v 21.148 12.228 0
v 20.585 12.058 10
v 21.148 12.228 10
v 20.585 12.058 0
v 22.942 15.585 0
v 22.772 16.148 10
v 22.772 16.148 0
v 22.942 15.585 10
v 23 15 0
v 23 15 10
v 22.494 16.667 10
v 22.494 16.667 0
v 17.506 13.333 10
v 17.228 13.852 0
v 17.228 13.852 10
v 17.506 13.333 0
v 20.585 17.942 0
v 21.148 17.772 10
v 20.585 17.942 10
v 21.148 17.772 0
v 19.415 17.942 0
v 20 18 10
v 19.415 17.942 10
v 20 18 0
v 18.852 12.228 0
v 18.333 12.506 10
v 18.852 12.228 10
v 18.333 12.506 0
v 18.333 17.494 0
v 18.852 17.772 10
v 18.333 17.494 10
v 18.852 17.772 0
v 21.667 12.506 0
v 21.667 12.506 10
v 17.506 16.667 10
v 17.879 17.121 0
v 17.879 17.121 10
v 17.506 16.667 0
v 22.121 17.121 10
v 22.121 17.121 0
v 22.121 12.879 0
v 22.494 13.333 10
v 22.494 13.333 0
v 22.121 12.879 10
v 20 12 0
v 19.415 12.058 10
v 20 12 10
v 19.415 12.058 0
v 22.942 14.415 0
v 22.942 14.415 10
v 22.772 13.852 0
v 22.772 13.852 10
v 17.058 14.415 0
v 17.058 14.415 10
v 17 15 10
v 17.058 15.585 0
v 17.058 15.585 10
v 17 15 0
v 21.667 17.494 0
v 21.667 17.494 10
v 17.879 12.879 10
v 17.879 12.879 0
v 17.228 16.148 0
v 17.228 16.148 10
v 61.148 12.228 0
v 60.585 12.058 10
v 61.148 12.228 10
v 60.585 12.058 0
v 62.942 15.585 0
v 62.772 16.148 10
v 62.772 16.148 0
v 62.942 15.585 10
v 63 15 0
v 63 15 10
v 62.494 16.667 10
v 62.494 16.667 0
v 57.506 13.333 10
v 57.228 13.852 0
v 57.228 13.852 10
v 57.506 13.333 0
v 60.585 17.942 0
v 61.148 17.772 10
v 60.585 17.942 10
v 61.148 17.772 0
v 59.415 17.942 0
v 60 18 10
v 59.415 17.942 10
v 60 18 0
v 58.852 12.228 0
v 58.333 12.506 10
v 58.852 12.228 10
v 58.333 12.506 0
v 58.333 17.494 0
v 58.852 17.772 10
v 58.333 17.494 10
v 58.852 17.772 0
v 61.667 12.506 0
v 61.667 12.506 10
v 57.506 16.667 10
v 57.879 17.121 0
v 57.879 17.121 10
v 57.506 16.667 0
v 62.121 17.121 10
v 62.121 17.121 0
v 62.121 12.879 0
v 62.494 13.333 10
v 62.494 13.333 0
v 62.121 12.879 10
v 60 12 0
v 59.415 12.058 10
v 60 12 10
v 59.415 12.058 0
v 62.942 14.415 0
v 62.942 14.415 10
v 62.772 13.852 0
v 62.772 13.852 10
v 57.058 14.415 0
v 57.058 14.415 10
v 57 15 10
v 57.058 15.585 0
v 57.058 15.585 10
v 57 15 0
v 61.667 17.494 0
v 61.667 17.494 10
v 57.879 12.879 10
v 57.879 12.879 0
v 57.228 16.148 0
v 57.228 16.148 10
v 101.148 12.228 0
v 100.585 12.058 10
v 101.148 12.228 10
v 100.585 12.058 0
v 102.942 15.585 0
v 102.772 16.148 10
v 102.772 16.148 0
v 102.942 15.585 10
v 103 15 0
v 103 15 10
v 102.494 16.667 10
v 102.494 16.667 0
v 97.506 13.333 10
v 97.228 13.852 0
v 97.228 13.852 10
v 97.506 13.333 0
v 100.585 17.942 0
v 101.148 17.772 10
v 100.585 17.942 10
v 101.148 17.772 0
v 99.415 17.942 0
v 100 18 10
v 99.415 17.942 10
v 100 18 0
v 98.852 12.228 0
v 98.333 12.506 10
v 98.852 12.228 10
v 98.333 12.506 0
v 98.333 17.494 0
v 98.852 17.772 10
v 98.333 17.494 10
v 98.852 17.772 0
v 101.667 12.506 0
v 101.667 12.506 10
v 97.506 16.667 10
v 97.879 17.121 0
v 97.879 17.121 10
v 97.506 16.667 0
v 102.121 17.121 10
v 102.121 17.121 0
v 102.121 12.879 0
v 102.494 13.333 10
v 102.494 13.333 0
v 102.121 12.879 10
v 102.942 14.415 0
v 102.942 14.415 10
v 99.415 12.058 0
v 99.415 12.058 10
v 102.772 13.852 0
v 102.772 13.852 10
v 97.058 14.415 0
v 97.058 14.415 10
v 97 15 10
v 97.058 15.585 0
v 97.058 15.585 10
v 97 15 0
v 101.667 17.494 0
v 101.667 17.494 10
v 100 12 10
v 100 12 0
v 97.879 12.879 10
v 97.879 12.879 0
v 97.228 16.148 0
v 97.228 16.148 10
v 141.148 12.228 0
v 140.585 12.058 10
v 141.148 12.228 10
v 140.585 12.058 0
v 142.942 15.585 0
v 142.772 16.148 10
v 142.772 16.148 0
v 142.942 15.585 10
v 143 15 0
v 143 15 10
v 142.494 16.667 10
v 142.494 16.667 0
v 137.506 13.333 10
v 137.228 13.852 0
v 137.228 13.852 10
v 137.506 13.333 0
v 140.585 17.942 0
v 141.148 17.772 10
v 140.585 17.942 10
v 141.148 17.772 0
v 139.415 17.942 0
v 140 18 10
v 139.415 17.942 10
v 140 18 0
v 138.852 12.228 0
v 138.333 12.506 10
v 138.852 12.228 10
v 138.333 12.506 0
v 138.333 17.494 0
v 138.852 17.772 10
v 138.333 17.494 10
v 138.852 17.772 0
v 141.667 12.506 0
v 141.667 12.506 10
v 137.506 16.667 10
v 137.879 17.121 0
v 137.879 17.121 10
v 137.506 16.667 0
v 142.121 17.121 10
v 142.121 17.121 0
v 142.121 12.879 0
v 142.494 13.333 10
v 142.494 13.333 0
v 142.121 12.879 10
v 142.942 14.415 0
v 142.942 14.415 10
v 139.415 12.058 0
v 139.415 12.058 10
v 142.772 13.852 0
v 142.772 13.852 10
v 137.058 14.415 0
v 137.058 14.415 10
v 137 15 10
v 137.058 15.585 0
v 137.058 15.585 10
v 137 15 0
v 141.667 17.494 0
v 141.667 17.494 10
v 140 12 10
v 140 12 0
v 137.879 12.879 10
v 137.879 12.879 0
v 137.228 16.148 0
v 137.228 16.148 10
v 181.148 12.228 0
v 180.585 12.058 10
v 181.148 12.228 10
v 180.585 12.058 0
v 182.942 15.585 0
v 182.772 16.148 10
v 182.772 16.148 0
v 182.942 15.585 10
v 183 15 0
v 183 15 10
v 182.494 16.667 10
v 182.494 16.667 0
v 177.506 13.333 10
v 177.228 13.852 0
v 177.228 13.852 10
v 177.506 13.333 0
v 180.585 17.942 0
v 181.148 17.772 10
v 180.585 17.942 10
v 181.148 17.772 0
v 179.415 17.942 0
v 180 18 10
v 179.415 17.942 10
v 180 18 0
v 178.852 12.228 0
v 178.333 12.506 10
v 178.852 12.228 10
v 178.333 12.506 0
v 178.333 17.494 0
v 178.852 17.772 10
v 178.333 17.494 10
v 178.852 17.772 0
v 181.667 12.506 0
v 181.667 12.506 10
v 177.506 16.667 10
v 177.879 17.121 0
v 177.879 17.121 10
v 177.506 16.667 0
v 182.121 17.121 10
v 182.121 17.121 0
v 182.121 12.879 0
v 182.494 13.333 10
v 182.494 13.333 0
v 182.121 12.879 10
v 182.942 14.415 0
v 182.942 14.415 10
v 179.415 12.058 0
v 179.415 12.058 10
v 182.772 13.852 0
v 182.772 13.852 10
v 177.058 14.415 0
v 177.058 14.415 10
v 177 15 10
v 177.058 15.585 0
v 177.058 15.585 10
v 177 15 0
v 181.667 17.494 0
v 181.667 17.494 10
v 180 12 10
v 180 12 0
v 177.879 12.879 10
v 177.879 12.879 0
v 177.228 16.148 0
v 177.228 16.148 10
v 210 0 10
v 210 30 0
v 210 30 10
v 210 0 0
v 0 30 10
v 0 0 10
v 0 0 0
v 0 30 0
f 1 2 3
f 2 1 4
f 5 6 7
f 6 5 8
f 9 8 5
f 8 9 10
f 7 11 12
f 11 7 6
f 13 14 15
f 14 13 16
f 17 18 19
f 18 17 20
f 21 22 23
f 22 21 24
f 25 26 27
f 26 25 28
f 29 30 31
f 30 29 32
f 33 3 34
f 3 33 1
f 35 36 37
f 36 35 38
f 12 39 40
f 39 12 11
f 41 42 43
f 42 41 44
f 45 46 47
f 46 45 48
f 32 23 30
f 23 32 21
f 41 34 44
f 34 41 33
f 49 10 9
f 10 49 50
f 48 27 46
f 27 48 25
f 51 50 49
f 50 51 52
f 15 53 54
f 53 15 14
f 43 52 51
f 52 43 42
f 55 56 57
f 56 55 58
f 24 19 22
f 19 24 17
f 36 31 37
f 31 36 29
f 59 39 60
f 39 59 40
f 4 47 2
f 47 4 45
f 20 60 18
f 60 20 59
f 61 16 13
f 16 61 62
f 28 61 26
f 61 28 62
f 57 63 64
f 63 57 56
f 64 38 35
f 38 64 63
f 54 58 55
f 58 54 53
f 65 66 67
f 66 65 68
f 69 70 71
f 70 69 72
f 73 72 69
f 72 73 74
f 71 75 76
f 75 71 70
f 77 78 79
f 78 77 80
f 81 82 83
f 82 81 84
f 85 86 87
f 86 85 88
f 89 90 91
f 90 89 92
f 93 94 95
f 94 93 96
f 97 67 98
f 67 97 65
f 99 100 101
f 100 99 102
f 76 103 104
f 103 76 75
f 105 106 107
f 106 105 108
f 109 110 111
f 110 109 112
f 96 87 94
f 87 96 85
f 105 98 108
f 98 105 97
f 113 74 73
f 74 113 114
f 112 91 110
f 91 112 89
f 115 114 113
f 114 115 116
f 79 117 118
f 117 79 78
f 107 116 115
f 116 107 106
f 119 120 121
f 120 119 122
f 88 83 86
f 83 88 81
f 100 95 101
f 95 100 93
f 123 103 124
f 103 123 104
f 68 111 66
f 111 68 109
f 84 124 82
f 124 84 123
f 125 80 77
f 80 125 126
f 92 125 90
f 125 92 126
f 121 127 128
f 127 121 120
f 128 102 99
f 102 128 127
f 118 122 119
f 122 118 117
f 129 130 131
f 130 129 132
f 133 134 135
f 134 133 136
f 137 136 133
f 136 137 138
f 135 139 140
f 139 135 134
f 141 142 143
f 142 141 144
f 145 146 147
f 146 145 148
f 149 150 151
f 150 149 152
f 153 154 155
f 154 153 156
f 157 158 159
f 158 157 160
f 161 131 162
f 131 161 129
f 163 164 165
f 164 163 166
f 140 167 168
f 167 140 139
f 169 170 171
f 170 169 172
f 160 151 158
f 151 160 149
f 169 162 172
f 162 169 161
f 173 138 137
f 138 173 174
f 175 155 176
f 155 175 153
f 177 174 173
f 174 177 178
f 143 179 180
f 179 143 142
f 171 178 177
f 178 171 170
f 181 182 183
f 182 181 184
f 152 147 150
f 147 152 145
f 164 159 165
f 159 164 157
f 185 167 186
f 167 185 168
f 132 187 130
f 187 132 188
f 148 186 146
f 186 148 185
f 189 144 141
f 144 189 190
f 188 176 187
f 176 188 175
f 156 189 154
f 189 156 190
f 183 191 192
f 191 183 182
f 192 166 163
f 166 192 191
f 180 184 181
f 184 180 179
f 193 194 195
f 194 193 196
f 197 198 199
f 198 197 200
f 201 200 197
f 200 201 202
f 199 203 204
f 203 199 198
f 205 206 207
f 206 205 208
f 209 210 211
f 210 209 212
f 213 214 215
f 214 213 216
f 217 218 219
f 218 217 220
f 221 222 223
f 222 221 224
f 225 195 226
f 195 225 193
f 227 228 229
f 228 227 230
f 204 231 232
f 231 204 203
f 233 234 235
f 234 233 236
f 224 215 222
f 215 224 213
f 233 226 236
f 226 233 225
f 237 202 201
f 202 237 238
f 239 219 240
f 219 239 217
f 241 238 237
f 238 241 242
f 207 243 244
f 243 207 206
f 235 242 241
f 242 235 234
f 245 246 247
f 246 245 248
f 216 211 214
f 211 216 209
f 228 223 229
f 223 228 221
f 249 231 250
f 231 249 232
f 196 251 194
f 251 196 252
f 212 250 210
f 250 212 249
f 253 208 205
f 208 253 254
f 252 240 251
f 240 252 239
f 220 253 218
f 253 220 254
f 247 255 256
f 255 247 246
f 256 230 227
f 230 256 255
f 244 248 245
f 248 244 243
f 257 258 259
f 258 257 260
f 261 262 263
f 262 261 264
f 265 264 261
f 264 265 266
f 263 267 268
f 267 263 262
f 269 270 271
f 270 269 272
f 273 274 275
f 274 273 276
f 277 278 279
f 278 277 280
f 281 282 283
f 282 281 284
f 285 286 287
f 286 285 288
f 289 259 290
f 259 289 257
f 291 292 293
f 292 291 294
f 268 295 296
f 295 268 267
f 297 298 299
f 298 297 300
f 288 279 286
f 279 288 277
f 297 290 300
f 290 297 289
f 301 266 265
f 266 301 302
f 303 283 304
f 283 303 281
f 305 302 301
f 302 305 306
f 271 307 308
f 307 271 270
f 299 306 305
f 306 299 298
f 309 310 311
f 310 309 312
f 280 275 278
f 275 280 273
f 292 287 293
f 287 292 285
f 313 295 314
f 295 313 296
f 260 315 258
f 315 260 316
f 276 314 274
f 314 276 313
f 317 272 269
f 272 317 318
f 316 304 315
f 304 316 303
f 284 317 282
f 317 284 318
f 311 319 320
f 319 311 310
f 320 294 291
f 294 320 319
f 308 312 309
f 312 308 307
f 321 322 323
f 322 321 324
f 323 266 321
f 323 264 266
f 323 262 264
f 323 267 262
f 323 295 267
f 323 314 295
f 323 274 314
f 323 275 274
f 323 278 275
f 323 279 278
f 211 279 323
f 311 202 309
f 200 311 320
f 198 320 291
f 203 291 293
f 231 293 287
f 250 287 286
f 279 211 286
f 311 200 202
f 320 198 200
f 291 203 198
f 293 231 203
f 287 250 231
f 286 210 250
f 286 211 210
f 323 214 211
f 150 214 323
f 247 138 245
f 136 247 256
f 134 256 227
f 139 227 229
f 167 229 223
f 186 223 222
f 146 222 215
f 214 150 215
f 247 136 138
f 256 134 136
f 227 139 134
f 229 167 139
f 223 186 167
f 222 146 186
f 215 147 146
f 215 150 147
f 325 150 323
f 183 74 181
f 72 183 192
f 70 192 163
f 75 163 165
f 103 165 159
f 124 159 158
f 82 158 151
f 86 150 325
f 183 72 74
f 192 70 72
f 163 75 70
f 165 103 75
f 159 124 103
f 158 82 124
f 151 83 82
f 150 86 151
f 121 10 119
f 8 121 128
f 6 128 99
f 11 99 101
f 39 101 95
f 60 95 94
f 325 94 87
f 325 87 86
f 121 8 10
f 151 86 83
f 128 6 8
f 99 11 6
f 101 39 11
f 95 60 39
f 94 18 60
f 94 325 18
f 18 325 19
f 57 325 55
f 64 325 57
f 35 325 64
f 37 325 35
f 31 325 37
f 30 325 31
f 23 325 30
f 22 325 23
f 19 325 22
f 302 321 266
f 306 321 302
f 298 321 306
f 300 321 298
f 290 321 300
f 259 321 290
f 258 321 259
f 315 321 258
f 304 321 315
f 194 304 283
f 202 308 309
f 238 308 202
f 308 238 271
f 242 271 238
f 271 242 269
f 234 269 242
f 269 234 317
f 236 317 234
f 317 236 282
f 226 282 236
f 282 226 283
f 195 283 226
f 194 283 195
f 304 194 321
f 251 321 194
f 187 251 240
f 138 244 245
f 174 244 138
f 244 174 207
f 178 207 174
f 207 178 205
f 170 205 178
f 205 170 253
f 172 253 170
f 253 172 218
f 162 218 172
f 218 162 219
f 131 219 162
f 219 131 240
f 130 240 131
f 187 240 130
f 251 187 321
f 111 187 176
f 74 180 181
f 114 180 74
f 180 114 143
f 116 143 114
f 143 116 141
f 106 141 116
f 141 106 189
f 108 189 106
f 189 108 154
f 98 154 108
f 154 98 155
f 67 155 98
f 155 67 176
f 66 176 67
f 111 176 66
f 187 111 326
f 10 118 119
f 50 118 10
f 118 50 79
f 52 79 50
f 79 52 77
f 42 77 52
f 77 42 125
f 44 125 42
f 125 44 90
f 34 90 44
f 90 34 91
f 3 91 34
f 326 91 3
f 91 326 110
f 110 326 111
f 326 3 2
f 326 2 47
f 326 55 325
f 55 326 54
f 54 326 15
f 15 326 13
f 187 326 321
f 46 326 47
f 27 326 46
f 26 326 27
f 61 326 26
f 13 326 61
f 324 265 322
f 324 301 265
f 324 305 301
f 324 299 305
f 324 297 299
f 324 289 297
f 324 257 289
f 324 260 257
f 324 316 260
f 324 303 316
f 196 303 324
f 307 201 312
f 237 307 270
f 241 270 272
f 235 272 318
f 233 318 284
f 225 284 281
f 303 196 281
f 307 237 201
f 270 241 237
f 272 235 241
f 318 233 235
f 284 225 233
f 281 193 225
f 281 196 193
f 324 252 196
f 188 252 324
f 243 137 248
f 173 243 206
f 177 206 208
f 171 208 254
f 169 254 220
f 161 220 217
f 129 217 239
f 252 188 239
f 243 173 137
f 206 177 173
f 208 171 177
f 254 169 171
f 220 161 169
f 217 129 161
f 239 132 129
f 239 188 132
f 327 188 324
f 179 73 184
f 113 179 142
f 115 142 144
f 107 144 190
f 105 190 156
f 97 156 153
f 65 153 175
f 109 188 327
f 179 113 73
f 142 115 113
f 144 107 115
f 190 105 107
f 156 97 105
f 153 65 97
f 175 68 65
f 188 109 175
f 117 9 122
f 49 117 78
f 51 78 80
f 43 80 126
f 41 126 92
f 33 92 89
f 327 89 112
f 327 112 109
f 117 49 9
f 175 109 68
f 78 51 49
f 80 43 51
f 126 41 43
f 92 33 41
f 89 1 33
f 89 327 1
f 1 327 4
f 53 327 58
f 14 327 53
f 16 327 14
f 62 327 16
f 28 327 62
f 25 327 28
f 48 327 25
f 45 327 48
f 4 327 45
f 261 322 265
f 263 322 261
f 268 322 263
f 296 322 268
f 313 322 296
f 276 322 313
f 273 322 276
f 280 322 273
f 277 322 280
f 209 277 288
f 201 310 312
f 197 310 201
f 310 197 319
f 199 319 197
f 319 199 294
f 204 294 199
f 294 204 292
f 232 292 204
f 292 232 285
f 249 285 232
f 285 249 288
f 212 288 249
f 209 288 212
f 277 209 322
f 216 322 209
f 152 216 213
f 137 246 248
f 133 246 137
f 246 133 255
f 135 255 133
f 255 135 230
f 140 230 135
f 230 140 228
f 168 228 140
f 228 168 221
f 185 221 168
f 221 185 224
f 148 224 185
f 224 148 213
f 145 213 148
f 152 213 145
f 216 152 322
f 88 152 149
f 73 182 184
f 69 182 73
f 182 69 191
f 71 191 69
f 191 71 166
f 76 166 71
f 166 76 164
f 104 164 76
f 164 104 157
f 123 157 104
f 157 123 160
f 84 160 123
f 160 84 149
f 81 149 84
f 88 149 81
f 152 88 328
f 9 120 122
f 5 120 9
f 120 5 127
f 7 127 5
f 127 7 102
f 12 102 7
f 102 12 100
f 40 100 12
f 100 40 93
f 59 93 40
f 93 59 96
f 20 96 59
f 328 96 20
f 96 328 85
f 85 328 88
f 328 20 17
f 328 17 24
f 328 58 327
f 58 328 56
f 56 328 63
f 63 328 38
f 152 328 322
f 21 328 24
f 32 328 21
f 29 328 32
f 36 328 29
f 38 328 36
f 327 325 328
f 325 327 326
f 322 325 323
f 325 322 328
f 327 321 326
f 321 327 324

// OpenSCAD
$fn = 32;

// ----------------------------------------------------------------------
// Long rail: 200-250 mm mounting rail
// ----------------------------------------------------------------------

// --- parameters (mm) ---
rail_l = 210;             // rail length, X
rail_w = 30;              // rail width, Y
rail_t = 10;              // rail thickness, Z
hole_d = 6;               // mounting hole diameter
hole_start = 20;          // first hole offset from the end
hole_pitch = 40;          // hole pitch
holes = 5;                // number of holes
fit_tol = 0.1;            // tolerance for press fits, mm
free_tol = 0.3;           // tolerance for clearance fits, mm

difference() {
  cube([rail_l, rail_w, rail_t]);
  for (i = [0 : holes - 1])
    translate([hole_start + i * hole_pitch, rail_w / 2, -1])
      cylinder(h = rail_t + 2, d = hole_d);
}
